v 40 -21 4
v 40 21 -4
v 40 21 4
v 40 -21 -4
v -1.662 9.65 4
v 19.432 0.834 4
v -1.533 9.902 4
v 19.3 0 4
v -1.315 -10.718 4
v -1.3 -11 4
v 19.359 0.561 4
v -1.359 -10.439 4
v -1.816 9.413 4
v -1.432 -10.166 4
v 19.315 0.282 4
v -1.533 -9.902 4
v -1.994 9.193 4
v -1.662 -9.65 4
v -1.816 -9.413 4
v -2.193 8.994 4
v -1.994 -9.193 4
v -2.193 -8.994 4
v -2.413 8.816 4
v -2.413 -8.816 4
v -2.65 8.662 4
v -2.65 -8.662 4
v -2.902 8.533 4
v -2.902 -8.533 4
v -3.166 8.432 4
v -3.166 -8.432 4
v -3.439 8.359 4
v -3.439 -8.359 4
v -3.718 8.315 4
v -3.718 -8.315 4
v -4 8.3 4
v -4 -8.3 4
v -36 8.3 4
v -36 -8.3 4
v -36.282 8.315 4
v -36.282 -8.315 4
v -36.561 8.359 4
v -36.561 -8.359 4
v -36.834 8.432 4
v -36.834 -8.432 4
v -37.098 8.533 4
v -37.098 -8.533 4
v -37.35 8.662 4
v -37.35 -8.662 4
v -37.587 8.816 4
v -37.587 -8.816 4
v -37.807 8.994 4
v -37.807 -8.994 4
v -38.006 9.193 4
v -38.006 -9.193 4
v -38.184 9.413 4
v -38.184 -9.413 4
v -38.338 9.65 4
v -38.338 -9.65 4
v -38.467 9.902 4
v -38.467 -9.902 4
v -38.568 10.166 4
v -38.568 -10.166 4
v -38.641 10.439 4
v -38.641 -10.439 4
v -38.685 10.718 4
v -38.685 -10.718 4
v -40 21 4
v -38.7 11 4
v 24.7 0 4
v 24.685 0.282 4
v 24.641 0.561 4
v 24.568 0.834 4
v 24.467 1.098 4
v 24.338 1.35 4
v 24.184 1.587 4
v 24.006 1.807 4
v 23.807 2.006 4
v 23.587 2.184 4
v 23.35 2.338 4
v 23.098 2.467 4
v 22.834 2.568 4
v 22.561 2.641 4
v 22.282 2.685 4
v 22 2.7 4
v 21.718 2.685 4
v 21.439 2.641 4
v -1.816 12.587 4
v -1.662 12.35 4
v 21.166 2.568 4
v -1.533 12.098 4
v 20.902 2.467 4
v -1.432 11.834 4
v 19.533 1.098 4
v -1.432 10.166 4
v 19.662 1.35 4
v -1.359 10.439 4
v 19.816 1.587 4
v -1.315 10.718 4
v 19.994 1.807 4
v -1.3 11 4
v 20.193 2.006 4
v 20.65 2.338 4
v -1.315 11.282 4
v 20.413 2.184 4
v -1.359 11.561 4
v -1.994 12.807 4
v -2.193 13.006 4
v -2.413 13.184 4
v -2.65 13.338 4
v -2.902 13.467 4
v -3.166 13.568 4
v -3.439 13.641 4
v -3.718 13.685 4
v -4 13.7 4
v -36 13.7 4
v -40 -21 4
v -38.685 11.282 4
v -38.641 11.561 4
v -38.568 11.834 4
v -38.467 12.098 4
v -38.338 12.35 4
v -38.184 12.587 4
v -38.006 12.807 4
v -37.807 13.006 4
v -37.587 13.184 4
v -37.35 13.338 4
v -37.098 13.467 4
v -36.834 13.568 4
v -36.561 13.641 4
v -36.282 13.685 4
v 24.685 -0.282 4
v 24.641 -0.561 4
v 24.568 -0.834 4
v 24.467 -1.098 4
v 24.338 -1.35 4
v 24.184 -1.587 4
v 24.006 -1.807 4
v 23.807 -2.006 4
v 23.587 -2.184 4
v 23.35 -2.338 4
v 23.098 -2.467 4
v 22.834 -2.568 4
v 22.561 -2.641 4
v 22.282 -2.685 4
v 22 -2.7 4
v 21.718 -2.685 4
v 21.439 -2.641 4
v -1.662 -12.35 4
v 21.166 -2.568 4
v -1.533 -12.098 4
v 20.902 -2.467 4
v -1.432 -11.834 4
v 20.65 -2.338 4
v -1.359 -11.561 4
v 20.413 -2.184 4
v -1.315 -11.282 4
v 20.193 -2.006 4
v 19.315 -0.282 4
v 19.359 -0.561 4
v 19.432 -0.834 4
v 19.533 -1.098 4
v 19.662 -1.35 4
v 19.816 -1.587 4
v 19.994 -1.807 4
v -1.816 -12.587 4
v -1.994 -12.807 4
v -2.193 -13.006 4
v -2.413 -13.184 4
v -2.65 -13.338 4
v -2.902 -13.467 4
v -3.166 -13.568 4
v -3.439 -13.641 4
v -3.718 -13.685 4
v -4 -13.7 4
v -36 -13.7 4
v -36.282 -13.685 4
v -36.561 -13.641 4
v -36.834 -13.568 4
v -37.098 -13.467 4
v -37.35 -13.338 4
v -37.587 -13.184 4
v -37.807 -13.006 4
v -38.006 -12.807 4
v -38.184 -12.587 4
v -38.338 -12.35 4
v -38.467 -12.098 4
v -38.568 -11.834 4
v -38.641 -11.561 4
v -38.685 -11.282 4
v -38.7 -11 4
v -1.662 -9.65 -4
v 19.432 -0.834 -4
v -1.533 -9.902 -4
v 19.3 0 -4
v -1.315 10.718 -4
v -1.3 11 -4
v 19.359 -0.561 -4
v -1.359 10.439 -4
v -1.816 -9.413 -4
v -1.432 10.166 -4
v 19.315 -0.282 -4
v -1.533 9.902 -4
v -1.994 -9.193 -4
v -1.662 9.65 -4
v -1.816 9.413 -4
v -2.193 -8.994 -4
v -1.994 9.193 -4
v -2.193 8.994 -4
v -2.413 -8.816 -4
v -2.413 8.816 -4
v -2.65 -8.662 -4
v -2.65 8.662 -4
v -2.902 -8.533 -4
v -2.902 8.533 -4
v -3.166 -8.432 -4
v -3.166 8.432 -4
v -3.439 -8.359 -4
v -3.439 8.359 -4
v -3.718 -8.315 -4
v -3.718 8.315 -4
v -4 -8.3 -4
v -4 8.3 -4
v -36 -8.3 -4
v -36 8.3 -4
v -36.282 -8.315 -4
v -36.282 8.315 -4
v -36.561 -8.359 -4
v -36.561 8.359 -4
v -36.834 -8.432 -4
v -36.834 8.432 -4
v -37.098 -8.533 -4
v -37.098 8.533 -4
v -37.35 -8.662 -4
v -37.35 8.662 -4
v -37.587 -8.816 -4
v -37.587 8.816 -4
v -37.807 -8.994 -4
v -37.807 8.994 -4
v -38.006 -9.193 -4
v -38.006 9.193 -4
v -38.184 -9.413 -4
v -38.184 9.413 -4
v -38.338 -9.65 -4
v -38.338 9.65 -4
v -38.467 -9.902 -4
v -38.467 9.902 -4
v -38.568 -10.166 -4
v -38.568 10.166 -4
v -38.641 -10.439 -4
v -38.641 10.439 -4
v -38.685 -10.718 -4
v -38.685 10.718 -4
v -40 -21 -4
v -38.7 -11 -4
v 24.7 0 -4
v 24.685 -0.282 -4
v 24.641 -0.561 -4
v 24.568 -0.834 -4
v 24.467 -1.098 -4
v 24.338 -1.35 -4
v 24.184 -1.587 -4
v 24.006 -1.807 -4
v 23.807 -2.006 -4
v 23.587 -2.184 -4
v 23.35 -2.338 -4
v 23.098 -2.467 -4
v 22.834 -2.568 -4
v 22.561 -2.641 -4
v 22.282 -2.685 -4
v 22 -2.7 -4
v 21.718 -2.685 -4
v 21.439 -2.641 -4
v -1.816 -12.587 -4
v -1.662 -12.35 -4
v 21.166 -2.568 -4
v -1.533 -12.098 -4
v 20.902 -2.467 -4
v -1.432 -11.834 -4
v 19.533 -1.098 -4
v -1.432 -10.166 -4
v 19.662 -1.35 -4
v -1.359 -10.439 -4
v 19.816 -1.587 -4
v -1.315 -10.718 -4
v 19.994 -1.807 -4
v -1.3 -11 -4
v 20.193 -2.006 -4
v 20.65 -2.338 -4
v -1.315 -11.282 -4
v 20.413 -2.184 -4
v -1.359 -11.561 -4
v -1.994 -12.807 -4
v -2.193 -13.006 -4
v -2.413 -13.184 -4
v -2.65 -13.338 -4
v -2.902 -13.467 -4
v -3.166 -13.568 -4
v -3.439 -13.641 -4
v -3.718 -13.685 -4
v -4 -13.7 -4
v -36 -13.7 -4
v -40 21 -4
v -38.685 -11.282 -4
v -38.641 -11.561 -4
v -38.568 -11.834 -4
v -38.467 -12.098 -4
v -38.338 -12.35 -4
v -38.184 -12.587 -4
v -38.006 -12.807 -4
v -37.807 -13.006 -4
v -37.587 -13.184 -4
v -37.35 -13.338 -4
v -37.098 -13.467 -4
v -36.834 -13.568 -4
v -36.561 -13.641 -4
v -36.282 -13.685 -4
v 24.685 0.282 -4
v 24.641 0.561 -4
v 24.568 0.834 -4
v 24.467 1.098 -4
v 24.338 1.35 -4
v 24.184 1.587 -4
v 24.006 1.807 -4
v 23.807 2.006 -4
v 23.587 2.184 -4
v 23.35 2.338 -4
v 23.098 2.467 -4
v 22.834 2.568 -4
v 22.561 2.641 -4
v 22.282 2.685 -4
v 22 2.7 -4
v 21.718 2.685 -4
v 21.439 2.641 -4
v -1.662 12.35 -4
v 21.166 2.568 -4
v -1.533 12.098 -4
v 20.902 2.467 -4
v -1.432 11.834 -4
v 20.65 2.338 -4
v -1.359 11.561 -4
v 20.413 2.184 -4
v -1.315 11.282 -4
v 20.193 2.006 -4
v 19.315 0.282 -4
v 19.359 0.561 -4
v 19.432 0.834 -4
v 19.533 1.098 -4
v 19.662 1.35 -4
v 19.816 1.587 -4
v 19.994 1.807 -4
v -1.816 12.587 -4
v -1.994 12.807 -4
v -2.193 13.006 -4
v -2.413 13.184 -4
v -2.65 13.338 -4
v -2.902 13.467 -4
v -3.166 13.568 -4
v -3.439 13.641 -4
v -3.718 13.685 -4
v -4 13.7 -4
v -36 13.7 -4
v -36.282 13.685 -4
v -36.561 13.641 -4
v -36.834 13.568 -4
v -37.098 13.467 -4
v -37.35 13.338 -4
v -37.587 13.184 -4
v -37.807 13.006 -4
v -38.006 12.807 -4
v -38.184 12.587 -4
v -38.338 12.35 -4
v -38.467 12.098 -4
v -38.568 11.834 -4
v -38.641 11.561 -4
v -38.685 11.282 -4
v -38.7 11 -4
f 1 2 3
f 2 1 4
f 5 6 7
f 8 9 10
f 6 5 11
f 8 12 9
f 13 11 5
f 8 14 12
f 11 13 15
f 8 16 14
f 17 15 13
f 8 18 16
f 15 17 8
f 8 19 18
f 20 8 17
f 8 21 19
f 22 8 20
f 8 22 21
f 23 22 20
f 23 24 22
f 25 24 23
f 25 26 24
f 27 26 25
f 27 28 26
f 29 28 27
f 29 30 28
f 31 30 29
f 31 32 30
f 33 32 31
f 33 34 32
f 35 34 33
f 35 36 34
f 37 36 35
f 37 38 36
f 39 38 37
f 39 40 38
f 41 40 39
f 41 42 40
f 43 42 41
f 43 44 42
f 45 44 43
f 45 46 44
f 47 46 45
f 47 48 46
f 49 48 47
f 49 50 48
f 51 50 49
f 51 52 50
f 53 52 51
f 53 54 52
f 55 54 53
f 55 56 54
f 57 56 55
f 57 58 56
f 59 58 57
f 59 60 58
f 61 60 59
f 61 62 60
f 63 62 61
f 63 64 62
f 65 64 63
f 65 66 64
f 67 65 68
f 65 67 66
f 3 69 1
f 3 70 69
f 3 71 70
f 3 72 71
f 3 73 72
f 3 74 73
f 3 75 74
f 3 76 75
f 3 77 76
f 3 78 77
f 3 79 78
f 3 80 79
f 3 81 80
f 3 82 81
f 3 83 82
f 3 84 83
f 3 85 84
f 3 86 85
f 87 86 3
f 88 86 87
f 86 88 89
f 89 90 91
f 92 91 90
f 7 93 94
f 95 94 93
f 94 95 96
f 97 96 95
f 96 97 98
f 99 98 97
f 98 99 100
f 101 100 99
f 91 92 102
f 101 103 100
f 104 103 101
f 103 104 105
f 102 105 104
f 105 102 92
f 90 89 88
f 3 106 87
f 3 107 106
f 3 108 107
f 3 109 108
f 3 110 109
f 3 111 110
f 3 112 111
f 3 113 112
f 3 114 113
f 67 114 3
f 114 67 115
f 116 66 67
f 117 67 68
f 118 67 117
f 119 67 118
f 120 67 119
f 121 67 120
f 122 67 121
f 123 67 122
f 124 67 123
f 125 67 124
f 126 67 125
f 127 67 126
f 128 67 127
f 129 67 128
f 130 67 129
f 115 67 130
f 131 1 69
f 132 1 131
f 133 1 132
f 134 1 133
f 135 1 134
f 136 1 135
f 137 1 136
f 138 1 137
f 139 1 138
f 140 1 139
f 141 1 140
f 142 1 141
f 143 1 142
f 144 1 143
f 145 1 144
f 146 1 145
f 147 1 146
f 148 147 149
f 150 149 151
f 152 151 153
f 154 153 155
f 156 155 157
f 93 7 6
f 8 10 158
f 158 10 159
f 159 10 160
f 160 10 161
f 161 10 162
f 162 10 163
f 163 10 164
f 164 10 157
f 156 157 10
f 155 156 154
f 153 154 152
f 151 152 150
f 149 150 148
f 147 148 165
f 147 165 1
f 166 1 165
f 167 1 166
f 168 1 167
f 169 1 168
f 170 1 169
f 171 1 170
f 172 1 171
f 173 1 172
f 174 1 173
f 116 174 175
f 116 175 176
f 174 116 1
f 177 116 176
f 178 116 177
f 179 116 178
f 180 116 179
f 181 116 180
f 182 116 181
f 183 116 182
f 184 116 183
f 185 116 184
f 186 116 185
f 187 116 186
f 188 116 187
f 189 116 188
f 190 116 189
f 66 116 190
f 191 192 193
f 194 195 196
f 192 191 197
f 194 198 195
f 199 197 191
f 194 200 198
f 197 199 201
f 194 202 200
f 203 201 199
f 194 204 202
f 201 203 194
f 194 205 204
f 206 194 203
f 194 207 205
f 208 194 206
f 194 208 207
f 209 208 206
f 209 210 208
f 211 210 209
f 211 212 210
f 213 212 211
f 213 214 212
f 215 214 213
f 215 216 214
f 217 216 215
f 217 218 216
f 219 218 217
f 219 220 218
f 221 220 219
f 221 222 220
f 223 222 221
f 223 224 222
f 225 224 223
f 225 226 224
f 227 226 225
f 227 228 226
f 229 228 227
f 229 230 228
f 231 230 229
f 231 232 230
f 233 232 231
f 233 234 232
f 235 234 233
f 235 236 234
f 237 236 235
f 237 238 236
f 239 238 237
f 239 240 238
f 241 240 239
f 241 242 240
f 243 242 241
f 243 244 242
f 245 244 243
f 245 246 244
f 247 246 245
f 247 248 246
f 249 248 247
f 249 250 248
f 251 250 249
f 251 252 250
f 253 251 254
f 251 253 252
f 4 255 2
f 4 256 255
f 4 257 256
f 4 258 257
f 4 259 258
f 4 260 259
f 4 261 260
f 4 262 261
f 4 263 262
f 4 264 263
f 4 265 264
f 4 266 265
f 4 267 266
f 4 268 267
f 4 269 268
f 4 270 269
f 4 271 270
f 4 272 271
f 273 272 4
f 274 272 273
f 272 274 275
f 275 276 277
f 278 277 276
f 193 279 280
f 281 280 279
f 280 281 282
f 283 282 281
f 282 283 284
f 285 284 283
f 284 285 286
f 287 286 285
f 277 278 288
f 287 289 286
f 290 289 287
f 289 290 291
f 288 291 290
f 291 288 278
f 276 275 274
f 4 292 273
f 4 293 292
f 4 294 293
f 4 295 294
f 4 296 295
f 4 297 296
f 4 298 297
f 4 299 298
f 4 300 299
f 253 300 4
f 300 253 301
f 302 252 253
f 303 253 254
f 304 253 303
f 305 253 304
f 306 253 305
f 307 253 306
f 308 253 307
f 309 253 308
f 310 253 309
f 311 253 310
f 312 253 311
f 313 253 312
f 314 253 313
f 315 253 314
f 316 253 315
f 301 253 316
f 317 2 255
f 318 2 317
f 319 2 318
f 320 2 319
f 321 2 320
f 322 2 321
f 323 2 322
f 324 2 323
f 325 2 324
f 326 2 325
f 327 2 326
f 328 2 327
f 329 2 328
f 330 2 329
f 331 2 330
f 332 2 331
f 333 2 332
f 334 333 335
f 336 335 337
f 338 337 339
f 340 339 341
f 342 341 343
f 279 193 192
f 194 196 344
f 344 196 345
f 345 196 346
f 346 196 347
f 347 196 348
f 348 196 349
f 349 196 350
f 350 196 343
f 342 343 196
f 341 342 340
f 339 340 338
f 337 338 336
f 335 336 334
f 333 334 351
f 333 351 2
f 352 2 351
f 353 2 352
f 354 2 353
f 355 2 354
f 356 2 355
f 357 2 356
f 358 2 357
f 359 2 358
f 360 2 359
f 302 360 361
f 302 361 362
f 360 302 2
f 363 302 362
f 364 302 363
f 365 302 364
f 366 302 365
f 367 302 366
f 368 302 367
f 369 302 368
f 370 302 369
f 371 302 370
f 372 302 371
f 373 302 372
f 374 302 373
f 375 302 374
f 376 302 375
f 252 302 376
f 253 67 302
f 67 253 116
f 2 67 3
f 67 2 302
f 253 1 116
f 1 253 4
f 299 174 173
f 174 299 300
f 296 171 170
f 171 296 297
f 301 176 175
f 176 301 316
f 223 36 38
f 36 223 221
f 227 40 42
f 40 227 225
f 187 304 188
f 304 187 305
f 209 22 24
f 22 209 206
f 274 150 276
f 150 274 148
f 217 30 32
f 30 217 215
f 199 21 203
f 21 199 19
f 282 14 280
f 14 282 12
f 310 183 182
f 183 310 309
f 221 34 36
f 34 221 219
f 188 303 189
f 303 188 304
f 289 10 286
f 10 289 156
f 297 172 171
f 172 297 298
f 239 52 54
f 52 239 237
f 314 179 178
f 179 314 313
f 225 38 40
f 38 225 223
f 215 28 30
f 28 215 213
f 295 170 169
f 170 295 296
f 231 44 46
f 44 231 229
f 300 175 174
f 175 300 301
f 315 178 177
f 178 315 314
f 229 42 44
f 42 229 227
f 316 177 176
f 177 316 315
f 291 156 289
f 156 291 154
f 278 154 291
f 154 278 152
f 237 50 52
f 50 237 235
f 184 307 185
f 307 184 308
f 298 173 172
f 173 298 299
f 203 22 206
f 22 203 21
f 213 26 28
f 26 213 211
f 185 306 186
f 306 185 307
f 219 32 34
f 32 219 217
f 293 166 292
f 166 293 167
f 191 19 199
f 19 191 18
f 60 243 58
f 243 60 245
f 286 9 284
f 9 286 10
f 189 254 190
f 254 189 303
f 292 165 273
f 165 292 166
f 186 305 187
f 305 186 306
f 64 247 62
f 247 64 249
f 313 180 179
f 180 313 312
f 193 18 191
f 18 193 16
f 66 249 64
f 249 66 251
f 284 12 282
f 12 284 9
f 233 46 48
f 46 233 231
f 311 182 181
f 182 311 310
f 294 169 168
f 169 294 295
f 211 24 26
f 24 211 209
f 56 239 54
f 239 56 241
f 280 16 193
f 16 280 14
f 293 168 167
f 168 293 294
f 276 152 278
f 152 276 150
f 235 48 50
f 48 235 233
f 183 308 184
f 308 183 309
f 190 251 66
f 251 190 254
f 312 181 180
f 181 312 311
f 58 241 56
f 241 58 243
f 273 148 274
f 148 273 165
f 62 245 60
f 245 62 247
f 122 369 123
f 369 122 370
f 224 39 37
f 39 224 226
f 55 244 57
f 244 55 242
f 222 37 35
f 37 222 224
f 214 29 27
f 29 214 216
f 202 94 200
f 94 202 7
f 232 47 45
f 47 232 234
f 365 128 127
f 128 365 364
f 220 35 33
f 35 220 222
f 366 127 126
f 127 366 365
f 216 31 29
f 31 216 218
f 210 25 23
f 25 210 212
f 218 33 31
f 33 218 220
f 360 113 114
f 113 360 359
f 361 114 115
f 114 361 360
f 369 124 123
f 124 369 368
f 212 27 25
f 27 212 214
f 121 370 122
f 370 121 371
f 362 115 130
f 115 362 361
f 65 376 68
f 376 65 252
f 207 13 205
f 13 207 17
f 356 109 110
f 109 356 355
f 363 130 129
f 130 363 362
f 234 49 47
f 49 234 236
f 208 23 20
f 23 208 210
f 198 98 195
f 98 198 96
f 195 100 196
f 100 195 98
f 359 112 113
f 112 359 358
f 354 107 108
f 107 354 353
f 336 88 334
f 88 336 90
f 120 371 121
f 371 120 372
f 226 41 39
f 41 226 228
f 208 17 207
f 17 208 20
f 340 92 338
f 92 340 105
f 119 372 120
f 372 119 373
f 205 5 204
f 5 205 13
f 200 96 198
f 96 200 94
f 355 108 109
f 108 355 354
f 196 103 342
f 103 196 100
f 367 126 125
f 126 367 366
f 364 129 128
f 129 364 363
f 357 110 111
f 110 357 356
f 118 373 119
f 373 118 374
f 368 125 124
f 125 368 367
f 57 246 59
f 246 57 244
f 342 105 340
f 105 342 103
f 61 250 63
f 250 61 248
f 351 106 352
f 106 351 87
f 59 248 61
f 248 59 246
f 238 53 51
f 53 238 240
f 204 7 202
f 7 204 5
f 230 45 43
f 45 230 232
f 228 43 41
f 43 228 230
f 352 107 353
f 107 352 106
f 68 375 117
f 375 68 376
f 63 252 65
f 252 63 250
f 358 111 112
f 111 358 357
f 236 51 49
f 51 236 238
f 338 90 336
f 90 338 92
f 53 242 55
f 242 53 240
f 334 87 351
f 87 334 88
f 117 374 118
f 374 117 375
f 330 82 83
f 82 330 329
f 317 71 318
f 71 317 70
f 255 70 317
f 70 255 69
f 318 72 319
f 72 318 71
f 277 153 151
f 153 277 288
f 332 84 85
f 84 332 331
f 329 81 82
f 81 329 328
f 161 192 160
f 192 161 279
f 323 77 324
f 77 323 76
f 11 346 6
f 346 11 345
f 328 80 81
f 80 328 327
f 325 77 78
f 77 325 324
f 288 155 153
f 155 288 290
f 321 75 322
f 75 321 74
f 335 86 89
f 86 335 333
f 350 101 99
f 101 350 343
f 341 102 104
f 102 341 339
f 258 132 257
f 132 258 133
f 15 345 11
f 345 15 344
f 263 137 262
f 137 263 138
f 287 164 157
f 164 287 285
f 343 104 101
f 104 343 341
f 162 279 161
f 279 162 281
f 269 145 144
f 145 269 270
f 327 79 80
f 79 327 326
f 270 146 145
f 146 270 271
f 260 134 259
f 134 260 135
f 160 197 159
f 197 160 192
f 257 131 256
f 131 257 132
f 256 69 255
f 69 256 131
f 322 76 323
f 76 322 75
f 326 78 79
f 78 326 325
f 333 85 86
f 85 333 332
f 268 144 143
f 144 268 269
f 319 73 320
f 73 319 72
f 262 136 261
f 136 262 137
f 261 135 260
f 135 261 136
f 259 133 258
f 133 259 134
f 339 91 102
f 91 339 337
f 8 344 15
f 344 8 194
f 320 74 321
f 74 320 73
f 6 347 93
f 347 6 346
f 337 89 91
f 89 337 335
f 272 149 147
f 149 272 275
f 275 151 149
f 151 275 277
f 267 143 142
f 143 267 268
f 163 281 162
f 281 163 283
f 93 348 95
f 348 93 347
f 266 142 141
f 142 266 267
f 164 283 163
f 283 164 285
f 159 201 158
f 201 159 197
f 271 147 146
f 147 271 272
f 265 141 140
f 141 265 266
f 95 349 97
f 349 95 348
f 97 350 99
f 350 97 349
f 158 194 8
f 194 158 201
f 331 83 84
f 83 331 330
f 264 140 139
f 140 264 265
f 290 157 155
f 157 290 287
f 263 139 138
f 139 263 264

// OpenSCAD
// GT2 idler tensioner slide for 6 mm belt.
$fn = 60;
eps = 0.02;
slide_l = 80;
slide_w = 42;
slide_t = 8;
belt_w = 6;
slot_l = 32;
axle_d = 5.4;
axle_x = slide_l / 2 - 18;
module slot(y) {
    hull() {
        translate([-slide_l / 4 - slot_l / 2, y, -slide_t / 2 - eps]) cylinder(d = 5.4, h = slide_t + 2 * eps);
        translate([-slide_l / 4 + slot_l / 2, y, -slide_t / 2 - eps]) cylinder(d = 5.4, h = slide_t + 2 * eps);
    }
}
difference() {
    cube([slide_l, slide_w, slide_t], center = true);
    slot(-11);
    slot(11);
    translate([axle_x, 0, -slide_t / 2 - eps]) cylinder(d = axle_d, h = slide_t + 2 * eps);
}
